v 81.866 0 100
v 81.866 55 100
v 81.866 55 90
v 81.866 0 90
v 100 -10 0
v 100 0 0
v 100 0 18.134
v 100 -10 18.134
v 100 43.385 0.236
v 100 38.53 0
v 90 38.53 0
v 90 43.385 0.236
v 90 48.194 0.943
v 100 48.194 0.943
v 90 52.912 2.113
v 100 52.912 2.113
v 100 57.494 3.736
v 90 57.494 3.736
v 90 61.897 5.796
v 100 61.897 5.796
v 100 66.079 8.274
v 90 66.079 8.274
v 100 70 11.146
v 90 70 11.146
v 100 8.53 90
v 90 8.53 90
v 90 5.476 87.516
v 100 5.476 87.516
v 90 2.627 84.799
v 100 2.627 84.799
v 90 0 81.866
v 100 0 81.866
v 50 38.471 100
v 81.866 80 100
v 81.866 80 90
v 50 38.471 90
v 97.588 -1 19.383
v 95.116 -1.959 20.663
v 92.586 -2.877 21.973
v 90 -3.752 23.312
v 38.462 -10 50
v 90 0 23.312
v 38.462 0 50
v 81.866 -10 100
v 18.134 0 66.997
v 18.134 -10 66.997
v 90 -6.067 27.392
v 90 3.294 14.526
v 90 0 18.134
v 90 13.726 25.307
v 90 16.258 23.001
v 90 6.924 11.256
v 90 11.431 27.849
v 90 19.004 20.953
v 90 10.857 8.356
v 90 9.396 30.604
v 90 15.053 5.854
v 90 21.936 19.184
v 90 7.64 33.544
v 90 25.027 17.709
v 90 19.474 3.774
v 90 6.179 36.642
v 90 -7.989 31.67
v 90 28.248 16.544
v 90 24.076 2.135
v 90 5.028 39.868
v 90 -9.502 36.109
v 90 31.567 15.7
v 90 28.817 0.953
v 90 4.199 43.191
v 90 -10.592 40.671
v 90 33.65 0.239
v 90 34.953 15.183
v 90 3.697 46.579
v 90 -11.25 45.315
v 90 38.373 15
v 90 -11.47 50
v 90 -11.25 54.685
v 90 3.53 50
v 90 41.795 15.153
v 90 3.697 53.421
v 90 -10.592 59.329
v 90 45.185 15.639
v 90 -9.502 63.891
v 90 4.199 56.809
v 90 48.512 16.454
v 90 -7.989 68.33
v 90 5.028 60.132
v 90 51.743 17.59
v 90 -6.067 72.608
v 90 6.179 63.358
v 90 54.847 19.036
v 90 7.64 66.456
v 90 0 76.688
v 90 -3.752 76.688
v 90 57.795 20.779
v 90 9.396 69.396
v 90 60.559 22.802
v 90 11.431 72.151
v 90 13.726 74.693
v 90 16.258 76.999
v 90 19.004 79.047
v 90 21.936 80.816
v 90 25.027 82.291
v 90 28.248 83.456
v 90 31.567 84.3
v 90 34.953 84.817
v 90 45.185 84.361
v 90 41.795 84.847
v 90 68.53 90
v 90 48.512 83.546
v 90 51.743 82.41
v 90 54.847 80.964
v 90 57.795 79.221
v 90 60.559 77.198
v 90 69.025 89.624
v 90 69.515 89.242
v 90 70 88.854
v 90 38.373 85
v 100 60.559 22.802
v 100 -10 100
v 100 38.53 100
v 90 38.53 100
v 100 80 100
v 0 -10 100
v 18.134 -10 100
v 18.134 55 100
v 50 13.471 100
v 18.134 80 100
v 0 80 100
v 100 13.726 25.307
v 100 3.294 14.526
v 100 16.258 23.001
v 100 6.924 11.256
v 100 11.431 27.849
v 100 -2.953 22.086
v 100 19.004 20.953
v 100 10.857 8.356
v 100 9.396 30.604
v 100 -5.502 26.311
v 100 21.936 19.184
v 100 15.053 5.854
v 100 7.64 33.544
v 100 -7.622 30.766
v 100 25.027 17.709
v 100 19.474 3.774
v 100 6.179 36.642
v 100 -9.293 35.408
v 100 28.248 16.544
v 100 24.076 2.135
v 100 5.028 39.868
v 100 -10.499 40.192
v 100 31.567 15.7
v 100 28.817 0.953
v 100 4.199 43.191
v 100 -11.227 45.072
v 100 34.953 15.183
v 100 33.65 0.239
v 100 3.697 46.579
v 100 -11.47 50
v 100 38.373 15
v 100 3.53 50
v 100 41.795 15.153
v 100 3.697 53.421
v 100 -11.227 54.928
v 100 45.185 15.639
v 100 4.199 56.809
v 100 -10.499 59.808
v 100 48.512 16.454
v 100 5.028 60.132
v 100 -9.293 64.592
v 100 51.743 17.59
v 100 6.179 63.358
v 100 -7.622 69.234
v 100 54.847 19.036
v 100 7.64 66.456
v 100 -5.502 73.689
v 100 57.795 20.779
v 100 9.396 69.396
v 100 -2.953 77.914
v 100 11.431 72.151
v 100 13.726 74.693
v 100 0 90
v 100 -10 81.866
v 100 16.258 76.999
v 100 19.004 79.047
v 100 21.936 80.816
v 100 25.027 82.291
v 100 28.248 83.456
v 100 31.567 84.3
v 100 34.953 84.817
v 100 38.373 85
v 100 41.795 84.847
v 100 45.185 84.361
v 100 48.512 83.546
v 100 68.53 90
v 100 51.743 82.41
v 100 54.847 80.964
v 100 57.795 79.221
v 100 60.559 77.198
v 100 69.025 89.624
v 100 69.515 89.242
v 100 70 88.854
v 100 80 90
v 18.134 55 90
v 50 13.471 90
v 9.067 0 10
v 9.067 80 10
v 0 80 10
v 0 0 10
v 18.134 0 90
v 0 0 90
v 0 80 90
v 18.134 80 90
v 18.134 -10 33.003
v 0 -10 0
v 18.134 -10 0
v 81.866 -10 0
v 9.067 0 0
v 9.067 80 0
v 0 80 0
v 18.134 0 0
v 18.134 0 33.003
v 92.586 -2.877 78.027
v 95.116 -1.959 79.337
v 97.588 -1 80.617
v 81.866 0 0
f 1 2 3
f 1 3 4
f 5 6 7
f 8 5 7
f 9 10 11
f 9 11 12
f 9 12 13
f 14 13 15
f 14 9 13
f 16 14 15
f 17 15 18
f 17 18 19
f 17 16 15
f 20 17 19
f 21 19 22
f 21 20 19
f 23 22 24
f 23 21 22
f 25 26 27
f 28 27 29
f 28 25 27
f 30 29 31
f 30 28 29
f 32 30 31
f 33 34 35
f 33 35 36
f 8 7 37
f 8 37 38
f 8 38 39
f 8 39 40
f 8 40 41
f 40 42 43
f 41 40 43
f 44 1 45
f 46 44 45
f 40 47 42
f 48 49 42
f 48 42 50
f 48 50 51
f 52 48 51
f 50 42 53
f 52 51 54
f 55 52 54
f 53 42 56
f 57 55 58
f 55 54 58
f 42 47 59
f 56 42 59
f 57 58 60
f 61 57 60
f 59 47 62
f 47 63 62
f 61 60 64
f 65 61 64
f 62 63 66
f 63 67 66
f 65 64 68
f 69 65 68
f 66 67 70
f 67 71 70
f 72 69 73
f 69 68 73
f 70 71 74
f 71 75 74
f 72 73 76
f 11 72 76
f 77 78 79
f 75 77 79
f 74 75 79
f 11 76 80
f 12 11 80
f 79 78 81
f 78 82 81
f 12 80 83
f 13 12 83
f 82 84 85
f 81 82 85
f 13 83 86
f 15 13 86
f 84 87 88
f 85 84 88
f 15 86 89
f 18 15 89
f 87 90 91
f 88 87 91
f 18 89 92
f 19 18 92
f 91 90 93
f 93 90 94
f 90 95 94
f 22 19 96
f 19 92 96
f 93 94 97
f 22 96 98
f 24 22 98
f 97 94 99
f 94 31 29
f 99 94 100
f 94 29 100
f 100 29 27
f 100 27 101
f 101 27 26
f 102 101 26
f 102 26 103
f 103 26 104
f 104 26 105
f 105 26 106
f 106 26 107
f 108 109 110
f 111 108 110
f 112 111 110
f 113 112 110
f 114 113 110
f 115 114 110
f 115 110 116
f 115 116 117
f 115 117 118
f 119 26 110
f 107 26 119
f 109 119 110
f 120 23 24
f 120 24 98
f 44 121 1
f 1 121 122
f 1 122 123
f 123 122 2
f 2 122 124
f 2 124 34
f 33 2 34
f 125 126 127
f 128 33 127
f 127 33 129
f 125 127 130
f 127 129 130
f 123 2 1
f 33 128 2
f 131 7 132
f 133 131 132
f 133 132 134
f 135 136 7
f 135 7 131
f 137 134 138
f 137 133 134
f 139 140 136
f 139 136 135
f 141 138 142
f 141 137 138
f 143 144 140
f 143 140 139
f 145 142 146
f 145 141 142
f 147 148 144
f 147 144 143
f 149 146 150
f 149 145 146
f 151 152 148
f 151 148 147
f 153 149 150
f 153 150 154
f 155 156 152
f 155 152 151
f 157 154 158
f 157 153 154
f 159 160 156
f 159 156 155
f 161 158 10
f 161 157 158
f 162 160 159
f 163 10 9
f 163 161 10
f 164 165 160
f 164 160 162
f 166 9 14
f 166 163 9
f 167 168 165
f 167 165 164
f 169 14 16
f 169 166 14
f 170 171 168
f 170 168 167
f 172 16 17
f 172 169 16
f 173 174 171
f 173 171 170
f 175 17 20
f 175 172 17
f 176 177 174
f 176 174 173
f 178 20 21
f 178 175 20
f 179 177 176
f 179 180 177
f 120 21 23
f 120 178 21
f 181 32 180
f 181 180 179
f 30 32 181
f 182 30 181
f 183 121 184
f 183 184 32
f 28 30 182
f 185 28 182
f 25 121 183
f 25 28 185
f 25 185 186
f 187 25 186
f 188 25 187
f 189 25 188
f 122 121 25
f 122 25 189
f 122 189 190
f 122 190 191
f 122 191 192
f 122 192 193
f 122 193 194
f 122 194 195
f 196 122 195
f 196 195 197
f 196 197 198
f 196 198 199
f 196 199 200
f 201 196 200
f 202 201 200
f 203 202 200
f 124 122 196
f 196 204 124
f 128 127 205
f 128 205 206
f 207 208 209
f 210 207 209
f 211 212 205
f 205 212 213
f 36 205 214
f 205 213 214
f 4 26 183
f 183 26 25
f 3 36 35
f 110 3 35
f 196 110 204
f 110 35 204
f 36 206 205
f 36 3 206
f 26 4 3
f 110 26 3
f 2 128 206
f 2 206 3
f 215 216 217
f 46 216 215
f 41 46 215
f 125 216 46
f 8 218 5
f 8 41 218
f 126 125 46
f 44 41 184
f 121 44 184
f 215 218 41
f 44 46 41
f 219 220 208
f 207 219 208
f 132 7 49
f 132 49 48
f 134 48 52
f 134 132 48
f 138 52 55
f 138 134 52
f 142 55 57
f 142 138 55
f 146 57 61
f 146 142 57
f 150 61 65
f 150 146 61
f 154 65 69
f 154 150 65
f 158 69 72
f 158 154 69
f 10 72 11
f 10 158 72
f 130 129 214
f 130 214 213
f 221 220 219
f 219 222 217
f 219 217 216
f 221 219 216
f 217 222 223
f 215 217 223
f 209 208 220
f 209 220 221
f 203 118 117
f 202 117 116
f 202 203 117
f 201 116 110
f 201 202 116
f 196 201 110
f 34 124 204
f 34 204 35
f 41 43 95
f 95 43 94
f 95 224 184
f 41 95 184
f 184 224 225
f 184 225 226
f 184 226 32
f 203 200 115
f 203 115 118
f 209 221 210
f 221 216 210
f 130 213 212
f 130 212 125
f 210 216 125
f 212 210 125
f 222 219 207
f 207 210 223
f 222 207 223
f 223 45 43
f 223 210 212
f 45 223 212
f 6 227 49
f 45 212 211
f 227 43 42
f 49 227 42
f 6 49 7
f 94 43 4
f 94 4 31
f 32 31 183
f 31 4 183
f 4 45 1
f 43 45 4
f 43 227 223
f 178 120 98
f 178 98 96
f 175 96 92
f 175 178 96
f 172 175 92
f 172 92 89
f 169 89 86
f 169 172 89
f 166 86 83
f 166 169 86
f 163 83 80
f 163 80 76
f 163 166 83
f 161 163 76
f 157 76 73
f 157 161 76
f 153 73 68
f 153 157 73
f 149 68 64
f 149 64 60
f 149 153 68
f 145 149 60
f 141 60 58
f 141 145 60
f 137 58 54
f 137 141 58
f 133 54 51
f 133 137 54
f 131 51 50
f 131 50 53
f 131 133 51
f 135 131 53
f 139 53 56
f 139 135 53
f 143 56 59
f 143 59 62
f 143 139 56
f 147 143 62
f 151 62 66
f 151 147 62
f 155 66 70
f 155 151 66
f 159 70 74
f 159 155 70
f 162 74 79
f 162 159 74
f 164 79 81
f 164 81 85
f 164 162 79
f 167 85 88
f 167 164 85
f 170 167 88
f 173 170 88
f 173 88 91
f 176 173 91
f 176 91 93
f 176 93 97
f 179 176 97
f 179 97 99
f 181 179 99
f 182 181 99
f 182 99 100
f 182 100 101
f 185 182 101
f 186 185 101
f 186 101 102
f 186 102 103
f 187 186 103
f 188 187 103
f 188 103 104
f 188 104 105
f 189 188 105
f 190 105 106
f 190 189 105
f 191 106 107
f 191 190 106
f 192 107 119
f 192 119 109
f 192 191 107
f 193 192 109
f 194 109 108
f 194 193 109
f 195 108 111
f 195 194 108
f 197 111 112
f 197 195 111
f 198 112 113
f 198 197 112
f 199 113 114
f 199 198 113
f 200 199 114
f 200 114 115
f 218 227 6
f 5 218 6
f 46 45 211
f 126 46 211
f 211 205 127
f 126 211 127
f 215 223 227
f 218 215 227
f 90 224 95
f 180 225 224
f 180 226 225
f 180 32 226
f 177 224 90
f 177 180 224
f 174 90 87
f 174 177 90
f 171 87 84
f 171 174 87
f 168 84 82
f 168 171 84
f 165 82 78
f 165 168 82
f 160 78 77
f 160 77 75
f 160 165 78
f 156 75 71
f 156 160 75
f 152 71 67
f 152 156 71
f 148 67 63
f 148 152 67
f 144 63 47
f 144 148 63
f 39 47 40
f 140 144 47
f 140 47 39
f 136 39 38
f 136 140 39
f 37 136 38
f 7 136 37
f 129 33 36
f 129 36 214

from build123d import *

# Parameters (mm, degrees)
F1_DEPTH = 10
F3_DEPTH = 10
F5_DEPTH = 10
F6_W     = 9.066966
F6_H     = 10
F7_DEPTH = 80


with BuildPart() as f1:
    # F0 (on Front) → F1 (new body)
    with BuildSketch(Plane.XZ):
        Polygon((0, 100), (0, 0), (18.133933, 0), (18.133933, 33.002501), (81.866067, 0), (100, 0), (100, 18.133933), (38.462467, 50), (100, 81.866067), (100, 100), (81.866067, 100), (18.133933, 66.997499), (18.133933, 100), align=None)
    extrude(amount=F1_DEPTH)

    # F2 (on face) → F3 (join)
    with BuildSketch(Plane.YZ.offset(100)):
        with BuildLine():
            Line((60.558972, 77.197799), (70, 88.853999))
            ThreePointArc((70, 88.853999), (55.222721, 97.1312), (38.529907, 100))
            ThreePointArc((38.529907, 100), (-11.470093, 50), (38.529907, 0))
            ThreePointArc((38.529907, 0), (55.222721, 2.8688), (70, 11.146001))
            Line((70, 11.146001), (60.558972, 22.802201))
            ThreePointArc((60.558972, 22.802201), (3.529907, 50), (60.558972, 77.197799))
        make_face()
    extrude(amount=-F3_DEPTH)

    # F4 (on face) → F5 (join)
    with BuildSketch(Plane.XY.offset(100)):
        Polygon((0, -10), (18.133933, -10), (18.133933, 55), (50, 13.471332), (81.866067, 55), (81.866067, -10), (100, -10), (100, 80), (81.866067, 80), (50, 38.471332), (18.133933, 80), (0, 80), align=None)
    extrude(amount=-F5_DEPTH)

    # F6 (on face) → F7 (join)
    with BuildSketch(Plane(origin=(0, 0, 0), x_dir=(-1, 0, 0), z_dir=(0, 1, 0))):
        with Locations((-4.533483, 5)):
            Rectangle(F6_W, F6_H)
    extrude(amount=F7_DEPTH)


solid = f1.part
